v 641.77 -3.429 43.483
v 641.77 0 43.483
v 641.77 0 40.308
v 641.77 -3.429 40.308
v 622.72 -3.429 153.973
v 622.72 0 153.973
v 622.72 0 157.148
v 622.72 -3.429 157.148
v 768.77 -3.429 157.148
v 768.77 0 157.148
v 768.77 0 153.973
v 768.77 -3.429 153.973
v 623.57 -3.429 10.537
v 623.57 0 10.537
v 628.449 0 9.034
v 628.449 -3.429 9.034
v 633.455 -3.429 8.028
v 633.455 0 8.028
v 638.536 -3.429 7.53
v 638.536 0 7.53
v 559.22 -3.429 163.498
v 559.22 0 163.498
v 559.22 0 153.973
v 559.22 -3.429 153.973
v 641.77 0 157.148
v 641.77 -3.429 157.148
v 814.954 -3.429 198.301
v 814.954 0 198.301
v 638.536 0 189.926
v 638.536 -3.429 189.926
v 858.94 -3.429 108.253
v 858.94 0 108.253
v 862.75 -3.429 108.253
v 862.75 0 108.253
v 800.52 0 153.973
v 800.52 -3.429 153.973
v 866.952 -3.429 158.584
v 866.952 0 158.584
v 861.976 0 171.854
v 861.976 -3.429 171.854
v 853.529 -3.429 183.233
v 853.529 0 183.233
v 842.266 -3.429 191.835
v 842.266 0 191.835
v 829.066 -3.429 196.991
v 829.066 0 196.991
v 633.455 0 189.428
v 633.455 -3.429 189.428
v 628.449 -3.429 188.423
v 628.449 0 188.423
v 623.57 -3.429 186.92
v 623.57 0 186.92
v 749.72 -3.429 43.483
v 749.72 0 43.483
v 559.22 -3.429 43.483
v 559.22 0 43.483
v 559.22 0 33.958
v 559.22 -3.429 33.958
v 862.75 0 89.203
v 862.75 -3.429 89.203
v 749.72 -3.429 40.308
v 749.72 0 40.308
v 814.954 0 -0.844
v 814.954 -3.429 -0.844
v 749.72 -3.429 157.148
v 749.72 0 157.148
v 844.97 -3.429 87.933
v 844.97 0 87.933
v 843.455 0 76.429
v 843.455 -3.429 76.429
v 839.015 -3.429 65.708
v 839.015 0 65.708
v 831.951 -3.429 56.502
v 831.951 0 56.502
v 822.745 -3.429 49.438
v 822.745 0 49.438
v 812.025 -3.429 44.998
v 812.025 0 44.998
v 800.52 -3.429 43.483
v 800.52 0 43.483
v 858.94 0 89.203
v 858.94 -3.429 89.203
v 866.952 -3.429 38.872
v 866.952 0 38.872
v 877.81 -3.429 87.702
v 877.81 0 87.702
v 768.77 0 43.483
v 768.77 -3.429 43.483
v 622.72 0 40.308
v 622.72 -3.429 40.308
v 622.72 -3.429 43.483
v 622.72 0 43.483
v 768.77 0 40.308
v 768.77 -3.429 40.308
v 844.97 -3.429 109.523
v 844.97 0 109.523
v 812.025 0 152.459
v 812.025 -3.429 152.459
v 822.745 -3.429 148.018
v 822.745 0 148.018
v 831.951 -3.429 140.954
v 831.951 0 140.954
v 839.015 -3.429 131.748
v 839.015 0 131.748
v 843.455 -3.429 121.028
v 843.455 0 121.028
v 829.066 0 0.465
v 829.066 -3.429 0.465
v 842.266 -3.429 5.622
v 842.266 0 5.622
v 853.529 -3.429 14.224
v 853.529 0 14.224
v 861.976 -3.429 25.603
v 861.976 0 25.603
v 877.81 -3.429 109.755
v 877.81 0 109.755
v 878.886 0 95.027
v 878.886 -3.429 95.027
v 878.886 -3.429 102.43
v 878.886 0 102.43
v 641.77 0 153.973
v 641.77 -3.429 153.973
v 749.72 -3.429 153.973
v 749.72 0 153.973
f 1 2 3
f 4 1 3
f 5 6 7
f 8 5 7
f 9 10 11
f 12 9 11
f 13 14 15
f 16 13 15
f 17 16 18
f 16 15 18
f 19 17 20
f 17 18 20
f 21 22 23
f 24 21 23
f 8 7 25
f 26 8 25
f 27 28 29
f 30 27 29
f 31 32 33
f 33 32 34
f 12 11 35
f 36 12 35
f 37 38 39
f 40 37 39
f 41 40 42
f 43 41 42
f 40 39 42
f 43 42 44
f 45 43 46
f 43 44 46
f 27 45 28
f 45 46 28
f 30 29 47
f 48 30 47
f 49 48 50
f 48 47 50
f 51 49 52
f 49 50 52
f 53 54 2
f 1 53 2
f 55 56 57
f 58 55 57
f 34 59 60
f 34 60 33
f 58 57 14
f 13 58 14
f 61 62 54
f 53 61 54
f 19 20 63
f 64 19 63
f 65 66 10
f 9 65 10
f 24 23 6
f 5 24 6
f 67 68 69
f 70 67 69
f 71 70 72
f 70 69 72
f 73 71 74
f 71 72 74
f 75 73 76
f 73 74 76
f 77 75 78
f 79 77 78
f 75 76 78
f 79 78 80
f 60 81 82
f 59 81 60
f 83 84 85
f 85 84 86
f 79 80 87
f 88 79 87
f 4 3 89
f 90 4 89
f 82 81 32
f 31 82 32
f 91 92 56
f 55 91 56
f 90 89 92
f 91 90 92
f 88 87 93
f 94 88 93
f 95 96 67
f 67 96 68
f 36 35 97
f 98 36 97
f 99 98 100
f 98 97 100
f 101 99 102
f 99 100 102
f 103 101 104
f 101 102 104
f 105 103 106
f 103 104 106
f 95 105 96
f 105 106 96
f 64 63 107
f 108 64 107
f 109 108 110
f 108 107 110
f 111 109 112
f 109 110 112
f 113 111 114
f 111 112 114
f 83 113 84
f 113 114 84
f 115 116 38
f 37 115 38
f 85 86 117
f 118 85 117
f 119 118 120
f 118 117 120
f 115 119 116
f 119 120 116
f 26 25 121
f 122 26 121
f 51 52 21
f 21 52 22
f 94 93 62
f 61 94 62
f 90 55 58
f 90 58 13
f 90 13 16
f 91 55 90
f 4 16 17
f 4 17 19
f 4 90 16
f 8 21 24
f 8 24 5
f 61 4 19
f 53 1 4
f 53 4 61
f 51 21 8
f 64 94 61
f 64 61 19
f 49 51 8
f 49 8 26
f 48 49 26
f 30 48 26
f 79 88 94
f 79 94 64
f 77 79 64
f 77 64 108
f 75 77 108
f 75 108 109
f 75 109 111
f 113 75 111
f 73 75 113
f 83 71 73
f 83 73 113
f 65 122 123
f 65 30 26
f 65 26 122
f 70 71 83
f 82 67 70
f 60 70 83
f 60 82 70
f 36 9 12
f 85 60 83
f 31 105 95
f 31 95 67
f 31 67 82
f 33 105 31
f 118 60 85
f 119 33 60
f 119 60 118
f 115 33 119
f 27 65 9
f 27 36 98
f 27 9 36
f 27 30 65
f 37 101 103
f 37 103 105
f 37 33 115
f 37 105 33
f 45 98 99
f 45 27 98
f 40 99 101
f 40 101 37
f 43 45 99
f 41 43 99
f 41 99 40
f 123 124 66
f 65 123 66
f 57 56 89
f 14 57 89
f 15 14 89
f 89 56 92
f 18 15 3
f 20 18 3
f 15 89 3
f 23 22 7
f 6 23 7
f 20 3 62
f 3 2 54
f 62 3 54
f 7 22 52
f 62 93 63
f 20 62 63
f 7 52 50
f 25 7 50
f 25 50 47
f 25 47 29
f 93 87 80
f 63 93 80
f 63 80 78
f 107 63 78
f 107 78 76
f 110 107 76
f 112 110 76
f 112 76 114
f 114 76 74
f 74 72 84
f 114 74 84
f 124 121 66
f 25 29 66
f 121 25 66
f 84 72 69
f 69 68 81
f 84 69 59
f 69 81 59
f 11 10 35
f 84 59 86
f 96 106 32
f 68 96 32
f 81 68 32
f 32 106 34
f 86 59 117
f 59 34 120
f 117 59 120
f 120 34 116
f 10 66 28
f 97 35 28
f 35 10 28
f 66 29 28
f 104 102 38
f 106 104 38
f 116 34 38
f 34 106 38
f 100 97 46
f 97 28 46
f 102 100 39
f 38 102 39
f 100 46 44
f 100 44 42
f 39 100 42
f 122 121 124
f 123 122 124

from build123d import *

# Parameters (mm, degrees)
F0_W     = 3.81
F0_H     = 19.05
F1_DEPTH = 3.429


# Not quite as in the source:
# - ends of sketch curves that miss each other by under 0.0002 mm in the source are joined


with BuildPart() as f1:
    # F0 (on Front) → F1 (new body)
    with BuildSketch(Plane.XZ):
        with BuildLine():
            Line((641.7700144, 153.9733014), (749.7200144, 153.9733014))
            Line((749.7200144, 153.9733014), (749.7200144, 157.1483014))
            Line((749.7200144, 157.1483014), (768.7700144, 157.1483014))
            Line((768.7700144, 157.1483014), (768.7700144, 153.9733014))
            Line((768.7700144, 153.9733014), (800.5200144, 153.9733014))
            ThreePointArc((800.5200144, 153.9733014), (831.9509108237, 140.9541978237), (844.9700144, 109.5233014))
            Line((844.9700144, 109.5233014), (844.9700144, 87.9333014))
            ThreePointArc((844.9700144, 87.9333014), (831.9509108237, 56.5024049763), (800.5200144, 43.4833014))
            Line((800.5200144, 43.4833014), (768.7700144, 43.4833014))
            Line((768.7700144, 43.4833014), (768.7700144, 40.3083014))
            Line((768.7700144, 40.3083014), (749.7200144, 40.3083014))
            Line((749.7200144, 40.3083014), (749.7200144, 43.4833014))
            Line((749.7200144, 43.4833014), (641.7700144, 43.4833014))
            Line((641.7700144, 43.4833014), (641.7700144, 40.3083014))
            Line((641.7700144, 40.3083014), (622.7200144, 40.3083014))
            Line((622.7200144, 40.3083014), (622.7200144, 43.4833014))
            Line((622.7200144, 43.4833014), (559.2200144, 43.4833014))
            Line((559.2200144, 43.4833014), (559.2200144, 33.9583014))
            Line((559.2200144, 33.9583014), (623.5700762, 10.5367836))
            ThreePointArc((623.5700762, 10.5367836), (630.9394695232, 8.4681877562), (638.536009535, 7.5302985912))
            Line((638.536009535, 7.5302985912), (814.9544788, -0.844042))
            ThreePointArc((814.9544788, -0.844042), (848.1989075574, 9.5280670864), (866.95206277, 38.8724395401))
            Line((866.95206277, 38.8724395401), (877.8095982, 87.7019074))
            ThreePointArc((877.8095982, 87.7019074), (879.0206956, 98.7282890028), (877.80959757, 109.7546698599))
            Line((877.80959757, 109.7546698599), (866.9520634, 158.5841634))
            ThreePointArc((866.9520634, 158.5841634), (848.1988981839, 187.9285174732), (814.954479338, 198.3006334659))
            Line((814.954479338, 198.3006334659), (638.5360102, 189.9262902))
            ThreePointArc((638.5360102, 189.9262902), (630.9394701135, 188.9883897624), (623.5700733762, 186.9198015582))
            Line((623.5700733762, 186.9198015582), (559.2200144, 163.4983014))
            Line((559.2200144, 163.4983014), (559.2200144, 153.9733014))
            Line((559.2200144, 153.9733014), (622.7200144, 153.9733014))
            Line((622.7200144, 153.9733014), (622.7200144, 157.1483014))
            Line((622.7200144, 157.1483014), (641.7700144, 157.1483014))
            Line((641.7700144, 157.1483014), (641.7700144, 153.9733014))
        make_face()
        with Locations((860.8450144, 98.7283014)):
            Rectangle(F0_W, F0_H, mode=Mode.SUBTRACT)
    extrude(amount=F1_DEPTH)


solid = f1.part
